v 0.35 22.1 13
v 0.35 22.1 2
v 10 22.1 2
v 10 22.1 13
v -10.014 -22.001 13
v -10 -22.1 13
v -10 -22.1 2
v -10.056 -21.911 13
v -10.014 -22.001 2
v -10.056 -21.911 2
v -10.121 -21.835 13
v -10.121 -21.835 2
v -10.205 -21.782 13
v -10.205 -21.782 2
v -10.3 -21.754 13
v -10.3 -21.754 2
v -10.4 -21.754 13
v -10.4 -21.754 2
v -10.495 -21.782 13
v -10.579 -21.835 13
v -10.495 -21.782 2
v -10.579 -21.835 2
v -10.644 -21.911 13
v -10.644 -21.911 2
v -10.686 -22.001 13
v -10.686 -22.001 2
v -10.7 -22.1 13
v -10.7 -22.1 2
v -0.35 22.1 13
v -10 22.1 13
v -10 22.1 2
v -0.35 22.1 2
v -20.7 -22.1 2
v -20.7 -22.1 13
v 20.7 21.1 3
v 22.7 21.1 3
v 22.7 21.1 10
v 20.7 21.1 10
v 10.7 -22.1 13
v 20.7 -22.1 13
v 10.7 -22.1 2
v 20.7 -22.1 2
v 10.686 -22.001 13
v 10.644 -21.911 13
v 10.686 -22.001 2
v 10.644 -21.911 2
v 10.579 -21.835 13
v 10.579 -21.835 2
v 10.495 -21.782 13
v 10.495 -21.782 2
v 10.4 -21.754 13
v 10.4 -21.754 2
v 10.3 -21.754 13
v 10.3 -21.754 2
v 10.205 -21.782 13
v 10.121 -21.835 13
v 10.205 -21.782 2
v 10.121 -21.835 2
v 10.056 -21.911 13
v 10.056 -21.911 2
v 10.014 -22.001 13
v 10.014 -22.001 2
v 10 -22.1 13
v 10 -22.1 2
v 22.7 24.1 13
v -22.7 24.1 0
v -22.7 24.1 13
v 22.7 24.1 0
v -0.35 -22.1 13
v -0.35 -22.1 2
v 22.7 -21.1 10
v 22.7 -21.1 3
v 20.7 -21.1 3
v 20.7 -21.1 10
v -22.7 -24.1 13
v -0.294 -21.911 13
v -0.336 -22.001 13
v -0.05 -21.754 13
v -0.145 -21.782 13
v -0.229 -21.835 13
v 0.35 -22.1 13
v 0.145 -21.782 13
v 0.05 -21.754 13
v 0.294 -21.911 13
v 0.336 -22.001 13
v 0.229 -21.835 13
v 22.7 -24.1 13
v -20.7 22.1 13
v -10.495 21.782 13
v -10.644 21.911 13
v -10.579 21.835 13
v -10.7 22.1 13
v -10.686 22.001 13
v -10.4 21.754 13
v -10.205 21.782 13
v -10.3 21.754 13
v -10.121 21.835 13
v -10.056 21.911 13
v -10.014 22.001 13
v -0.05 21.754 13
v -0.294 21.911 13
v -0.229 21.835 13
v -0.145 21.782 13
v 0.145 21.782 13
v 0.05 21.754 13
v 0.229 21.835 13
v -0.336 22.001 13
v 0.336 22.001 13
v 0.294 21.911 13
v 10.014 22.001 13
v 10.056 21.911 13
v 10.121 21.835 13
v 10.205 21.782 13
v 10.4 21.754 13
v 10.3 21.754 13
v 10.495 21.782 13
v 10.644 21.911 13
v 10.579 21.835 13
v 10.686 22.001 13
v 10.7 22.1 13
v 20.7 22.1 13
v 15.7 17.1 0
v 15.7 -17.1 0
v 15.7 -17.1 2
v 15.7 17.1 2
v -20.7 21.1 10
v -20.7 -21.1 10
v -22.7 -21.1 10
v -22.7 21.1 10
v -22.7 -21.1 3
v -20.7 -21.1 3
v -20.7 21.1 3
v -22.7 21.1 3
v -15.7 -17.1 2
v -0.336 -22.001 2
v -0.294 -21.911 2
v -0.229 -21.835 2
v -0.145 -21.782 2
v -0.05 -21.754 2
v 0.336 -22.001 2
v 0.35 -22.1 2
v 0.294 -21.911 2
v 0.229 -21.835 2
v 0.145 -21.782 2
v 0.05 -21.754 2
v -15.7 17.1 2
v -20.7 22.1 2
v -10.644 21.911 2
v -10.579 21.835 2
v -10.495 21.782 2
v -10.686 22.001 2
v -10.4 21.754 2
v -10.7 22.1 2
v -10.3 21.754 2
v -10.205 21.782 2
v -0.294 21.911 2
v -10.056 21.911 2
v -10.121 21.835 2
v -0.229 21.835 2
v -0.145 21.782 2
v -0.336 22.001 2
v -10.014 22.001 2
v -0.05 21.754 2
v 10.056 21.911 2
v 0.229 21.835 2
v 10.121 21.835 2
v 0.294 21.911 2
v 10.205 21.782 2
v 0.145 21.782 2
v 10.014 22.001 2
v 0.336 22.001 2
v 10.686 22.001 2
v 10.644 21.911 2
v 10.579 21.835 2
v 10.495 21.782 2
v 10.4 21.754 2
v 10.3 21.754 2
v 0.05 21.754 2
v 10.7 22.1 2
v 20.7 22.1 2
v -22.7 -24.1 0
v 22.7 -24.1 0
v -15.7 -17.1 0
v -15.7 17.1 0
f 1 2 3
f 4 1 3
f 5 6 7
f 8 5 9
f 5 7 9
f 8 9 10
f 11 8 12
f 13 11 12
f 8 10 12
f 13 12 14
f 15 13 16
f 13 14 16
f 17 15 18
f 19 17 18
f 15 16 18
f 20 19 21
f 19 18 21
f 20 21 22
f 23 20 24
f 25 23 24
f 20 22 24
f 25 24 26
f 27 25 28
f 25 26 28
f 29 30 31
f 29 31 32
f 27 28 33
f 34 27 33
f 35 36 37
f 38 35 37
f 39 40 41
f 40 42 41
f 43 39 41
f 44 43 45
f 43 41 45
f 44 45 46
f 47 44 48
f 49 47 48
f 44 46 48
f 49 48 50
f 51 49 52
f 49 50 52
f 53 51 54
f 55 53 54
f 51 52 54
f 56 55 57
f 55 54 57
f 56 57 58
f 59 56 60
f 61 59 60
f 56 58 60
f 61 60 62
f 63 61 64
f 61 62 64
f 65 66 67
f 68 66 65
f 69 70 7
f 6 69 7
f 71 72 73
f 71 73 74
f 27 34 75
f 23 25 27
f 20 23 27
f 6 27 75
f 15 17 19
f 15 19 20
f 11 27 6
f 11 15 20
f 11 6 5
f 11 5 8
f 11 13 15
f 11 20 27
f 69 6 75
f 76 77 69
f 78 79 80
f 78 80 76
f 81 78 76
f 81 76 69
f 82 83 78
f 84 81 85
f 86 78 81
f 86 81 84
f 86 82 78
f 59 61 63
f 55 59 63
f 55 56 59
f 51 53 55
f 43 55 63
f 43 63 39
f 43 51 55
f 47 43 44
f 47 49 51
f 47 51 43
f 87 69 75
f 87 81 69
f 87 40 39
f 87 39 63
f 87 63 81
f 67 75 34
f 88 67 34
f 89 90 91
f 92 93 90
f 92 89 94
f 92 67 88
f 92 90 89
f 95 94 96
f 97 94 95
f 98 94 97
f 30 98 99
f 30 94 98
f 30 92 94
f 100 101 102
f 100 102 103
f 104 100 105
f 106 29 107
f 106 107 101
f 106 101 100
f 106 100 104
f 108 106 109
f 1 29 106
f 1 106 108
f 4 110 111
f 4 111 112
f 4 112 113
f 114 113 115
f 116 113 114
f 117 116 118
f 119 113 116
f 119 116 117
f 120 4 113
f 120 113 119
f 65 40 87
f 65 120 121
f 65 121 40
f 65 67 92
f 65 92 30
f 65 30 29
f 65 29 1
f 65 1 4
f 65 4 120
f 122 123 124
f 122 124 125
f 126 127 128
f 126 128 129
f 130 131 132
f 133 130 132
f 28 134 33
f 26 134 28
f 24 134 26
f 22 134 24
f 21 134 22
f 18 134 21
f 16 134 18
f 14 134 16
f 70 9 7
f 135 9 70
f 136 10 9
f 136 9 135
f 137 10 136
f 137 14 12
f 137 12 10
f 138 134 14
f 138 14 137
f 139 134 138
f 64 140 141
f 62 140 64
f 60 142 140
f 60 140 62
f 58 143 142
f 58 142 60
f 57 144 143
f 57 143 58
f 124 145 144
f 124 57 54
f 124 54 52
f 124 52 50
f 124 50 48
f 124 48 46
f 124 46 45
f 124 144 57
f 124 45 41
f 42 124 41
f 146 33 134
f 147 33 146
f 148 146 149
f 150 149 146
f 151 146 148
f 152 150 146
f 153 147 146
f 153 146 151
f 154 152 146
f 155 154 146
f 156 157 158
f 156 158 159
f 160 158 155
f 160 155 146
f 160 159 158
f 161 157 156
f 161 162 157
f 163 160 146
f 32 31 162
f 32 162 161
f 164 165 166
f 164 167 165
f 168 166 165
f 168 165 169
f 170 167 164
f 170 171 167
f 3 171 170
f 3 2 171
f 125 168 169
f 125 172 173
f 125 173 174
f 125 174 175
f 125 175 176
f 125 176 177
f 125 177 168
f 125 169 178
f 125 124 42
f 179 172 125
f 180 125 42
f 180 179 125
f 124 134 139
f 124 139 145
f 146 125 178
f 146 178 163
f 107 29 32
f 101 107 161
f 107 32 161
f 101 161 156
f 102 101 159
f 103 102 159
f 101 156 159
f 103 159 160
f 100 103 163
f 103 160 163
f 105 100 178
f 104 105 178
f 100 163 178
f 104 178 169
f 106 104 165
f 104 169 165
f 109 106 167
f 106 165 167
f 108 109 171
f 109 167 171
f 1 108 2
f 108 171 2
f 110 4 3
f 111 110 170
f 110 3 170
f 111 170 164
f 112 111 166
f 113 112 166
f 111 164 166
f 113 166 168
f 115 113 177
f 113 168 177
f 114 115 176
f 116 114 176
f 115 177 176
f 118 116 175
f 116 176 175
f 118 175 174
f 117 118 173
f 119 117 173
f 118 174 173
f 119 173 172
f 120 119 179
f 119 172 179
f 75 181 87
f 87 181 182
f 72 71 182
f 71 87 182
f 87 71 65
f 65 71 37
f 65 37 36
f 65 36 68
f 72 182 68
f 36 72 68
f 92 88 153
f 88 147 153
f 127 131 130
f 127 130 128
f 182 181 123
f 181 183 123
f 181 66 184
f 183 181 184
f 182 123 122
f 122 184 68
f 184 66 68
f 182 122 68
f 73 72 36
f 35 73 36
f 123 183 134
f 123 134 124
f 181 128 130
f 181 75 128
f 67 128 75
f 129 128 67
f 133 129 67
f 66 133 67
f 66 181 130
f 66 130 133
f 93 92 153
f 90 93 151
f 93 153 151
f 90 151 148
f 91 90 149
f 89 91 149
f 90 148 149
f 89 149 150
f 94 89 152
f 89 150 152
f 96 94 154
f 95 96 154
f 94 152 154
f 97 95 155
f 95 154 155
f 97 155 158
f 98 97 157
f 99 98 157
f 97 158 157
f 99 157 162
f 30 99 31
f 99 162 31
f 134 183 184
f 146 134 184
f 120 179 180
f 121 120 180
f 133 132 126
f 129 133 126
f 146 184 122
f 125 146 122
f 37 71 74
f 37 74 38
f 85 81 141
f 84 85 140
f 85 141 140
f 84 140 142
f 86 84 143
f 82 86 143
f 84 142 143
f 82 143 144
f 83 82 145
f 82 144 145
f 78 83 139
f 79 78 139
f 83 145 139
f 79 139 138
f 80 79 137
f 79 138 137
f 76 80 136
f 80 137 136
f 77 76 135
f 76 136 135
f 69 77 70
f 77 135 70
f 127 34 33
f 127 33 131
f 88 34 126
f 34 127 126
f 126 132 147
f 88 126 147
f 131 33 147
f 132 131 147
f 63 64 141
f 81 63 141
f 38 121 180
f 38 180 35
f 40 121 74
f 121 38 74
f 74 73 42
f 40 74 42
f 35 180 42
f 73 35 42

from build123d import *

# Parameters (mm, degrees)
F0_W     = 45.4
F0_H     = 48.2
F0_W_2   = 31.4
F0_H_2   = 34.2
F1_DEPTH = 2
F2_DEPTH = 13
F3_DEPTH = 13
F5_W     = 42.2
F5_H     = 7
F6_DEPTH = 80


with BuildPart() as f1:
    # F0 (on Top) → F1 (new body)
    with BuildSketch(Plane.XY):
        Rectangle(F0_W, F0_H)
        Polygon((-20.7, -22.1), (-20.7, 22.1), (-10.7, 22.1), (-10, 22.1), (-0.35, 22.1), (0.35, 22.1), (10, 22.1), (10.7, 22.1), (20.7, 22.1), (20.7, -22.1), (10.7, -22.1), (10, -22.1), (0.35, -22.1), (-0.35, -22.1), (-10, -22.1), (-10.7, -22.1), align=None, mode=Mode.SUBTRACT)
        with BuildLine():
            Line((-10.7, 22.1), (-20.7, 22.1))
            Line((-20.7, 22.1), (-20.7, -22.1))
            Line((-20.7, -22.1), (-10.7, -22.1))
            ThreePointArc((-10.7, -22.1), (-10.35, -21.75), (-10, -22.1))
            Line((-10, -22.1), (-0.35, -22.1))
            ThreePointArc((-0.35, -22.1), (0, -21.75), (0.35, -22.1))
            Line((0.35, -22.1), (10, -22.1))
            ThreePointArc((10, -22.1), (10.35, -21.75), (10.7, -22.1))
            Line((10.7, -22.1), (20.7, -22.1))
            Line((20.7, -22.1), (20.7, 22.1))
            Line((20.7, 22.1), (10.7, 22.1))
            ThreePointArc((10.7, 22.1), (10.35, 21.75), (10, 22.1))
            Line((10, 22.1), (0.35, 22.1))
            ThreePointArc((0.35, 22.1), (0, 21.75), (-0.35, 22.1))
            Line((-0.35, 22.1), (-10, 22.1))
            ThreePointArc((-10, 22.1), (-10.35, 21.75), (-10.7, 22.1))
        make_face()
        Rectangle(F0_W_2, F0_H_2, mode=Mode.SUBTRACT)
    extrude(amount=F1_DEPTH)

    # F0 (on Top) → F2 (join)
    with BuildSketch(Plane.XY):
        Rectangle(F0_W, F0_H)
        Polygon((-20.7, -22.1), (-20.7, 22.1), (-10.7, 22.1), (-10, 22.1), (-0.35, 22.1), (0.35, 22.1), (10, 22.1), (10.7, 22.1), (20.7, 22.1), (20.7, -22.1), (10.7, -22.1), (10, -22.1), (0.35, -22.1), (-0.35, -22.1), (-10, -22.1), (-10.7, -22.1), align=None, mode=Mode.SUBTRACT)
    extrude(amount=F2_DEPTH)

    # F0 (on Top) → F3 (join)
    with BuildSketch(Plane.XY):
        with BuildLine():
            Line((-10, 22.1), (-10.7, 22.1))
            ThreePointArc((-10.7, 22.1), (-10.35, 21.75), (-10, 22.1))
        make_face()
        with BuildLine():
            Line((0.35, 22.1), (-0.35, 22.1))
            ThreePointArc((-0.35, 22.1), (0, 21.75), (0.35, 22.1))
        make_face()
        with BuildLine():
            Line((10.7, 22.1), (10, 22.1))
            ThreePointArc((10, 22.1), (10.35, 21.75), (10.7, 22.1))
        make_face()
        with BuildLine():
            ThreePointArc((-10, -22.1), (-10.35, -21.75), (-10.7, -22.1))
            Line((-10.7, -22.1), (-10, -22.1))
        make_face()
        with BuildLine():
            ThreePointArc((0.35, -22.1), (0, -21.75), (-0.35, -22.1))
            Line((-0.35, -22.1), (0.35, -22.1))
        make_face()
        with BuildLine():
            ThreePointArc((10.7, -22.1), (10.35, -21.75), (10, -22.1))
            Line((10, -22.1), (10.7, -22.1))
        make_face()
    extrude(amount=F3_DEPTH)

    # F5 (on face) → F6 (cut)
    with BuildSketch(Plane.YZ.offset(22.7)):
        with Locations((0, 6.5)):
            Rectangle(F5_W, F5_H)
    extrude(amount=-F6_DEPTH, mode=Mode.SUBTRACT)


solid = f1.part
